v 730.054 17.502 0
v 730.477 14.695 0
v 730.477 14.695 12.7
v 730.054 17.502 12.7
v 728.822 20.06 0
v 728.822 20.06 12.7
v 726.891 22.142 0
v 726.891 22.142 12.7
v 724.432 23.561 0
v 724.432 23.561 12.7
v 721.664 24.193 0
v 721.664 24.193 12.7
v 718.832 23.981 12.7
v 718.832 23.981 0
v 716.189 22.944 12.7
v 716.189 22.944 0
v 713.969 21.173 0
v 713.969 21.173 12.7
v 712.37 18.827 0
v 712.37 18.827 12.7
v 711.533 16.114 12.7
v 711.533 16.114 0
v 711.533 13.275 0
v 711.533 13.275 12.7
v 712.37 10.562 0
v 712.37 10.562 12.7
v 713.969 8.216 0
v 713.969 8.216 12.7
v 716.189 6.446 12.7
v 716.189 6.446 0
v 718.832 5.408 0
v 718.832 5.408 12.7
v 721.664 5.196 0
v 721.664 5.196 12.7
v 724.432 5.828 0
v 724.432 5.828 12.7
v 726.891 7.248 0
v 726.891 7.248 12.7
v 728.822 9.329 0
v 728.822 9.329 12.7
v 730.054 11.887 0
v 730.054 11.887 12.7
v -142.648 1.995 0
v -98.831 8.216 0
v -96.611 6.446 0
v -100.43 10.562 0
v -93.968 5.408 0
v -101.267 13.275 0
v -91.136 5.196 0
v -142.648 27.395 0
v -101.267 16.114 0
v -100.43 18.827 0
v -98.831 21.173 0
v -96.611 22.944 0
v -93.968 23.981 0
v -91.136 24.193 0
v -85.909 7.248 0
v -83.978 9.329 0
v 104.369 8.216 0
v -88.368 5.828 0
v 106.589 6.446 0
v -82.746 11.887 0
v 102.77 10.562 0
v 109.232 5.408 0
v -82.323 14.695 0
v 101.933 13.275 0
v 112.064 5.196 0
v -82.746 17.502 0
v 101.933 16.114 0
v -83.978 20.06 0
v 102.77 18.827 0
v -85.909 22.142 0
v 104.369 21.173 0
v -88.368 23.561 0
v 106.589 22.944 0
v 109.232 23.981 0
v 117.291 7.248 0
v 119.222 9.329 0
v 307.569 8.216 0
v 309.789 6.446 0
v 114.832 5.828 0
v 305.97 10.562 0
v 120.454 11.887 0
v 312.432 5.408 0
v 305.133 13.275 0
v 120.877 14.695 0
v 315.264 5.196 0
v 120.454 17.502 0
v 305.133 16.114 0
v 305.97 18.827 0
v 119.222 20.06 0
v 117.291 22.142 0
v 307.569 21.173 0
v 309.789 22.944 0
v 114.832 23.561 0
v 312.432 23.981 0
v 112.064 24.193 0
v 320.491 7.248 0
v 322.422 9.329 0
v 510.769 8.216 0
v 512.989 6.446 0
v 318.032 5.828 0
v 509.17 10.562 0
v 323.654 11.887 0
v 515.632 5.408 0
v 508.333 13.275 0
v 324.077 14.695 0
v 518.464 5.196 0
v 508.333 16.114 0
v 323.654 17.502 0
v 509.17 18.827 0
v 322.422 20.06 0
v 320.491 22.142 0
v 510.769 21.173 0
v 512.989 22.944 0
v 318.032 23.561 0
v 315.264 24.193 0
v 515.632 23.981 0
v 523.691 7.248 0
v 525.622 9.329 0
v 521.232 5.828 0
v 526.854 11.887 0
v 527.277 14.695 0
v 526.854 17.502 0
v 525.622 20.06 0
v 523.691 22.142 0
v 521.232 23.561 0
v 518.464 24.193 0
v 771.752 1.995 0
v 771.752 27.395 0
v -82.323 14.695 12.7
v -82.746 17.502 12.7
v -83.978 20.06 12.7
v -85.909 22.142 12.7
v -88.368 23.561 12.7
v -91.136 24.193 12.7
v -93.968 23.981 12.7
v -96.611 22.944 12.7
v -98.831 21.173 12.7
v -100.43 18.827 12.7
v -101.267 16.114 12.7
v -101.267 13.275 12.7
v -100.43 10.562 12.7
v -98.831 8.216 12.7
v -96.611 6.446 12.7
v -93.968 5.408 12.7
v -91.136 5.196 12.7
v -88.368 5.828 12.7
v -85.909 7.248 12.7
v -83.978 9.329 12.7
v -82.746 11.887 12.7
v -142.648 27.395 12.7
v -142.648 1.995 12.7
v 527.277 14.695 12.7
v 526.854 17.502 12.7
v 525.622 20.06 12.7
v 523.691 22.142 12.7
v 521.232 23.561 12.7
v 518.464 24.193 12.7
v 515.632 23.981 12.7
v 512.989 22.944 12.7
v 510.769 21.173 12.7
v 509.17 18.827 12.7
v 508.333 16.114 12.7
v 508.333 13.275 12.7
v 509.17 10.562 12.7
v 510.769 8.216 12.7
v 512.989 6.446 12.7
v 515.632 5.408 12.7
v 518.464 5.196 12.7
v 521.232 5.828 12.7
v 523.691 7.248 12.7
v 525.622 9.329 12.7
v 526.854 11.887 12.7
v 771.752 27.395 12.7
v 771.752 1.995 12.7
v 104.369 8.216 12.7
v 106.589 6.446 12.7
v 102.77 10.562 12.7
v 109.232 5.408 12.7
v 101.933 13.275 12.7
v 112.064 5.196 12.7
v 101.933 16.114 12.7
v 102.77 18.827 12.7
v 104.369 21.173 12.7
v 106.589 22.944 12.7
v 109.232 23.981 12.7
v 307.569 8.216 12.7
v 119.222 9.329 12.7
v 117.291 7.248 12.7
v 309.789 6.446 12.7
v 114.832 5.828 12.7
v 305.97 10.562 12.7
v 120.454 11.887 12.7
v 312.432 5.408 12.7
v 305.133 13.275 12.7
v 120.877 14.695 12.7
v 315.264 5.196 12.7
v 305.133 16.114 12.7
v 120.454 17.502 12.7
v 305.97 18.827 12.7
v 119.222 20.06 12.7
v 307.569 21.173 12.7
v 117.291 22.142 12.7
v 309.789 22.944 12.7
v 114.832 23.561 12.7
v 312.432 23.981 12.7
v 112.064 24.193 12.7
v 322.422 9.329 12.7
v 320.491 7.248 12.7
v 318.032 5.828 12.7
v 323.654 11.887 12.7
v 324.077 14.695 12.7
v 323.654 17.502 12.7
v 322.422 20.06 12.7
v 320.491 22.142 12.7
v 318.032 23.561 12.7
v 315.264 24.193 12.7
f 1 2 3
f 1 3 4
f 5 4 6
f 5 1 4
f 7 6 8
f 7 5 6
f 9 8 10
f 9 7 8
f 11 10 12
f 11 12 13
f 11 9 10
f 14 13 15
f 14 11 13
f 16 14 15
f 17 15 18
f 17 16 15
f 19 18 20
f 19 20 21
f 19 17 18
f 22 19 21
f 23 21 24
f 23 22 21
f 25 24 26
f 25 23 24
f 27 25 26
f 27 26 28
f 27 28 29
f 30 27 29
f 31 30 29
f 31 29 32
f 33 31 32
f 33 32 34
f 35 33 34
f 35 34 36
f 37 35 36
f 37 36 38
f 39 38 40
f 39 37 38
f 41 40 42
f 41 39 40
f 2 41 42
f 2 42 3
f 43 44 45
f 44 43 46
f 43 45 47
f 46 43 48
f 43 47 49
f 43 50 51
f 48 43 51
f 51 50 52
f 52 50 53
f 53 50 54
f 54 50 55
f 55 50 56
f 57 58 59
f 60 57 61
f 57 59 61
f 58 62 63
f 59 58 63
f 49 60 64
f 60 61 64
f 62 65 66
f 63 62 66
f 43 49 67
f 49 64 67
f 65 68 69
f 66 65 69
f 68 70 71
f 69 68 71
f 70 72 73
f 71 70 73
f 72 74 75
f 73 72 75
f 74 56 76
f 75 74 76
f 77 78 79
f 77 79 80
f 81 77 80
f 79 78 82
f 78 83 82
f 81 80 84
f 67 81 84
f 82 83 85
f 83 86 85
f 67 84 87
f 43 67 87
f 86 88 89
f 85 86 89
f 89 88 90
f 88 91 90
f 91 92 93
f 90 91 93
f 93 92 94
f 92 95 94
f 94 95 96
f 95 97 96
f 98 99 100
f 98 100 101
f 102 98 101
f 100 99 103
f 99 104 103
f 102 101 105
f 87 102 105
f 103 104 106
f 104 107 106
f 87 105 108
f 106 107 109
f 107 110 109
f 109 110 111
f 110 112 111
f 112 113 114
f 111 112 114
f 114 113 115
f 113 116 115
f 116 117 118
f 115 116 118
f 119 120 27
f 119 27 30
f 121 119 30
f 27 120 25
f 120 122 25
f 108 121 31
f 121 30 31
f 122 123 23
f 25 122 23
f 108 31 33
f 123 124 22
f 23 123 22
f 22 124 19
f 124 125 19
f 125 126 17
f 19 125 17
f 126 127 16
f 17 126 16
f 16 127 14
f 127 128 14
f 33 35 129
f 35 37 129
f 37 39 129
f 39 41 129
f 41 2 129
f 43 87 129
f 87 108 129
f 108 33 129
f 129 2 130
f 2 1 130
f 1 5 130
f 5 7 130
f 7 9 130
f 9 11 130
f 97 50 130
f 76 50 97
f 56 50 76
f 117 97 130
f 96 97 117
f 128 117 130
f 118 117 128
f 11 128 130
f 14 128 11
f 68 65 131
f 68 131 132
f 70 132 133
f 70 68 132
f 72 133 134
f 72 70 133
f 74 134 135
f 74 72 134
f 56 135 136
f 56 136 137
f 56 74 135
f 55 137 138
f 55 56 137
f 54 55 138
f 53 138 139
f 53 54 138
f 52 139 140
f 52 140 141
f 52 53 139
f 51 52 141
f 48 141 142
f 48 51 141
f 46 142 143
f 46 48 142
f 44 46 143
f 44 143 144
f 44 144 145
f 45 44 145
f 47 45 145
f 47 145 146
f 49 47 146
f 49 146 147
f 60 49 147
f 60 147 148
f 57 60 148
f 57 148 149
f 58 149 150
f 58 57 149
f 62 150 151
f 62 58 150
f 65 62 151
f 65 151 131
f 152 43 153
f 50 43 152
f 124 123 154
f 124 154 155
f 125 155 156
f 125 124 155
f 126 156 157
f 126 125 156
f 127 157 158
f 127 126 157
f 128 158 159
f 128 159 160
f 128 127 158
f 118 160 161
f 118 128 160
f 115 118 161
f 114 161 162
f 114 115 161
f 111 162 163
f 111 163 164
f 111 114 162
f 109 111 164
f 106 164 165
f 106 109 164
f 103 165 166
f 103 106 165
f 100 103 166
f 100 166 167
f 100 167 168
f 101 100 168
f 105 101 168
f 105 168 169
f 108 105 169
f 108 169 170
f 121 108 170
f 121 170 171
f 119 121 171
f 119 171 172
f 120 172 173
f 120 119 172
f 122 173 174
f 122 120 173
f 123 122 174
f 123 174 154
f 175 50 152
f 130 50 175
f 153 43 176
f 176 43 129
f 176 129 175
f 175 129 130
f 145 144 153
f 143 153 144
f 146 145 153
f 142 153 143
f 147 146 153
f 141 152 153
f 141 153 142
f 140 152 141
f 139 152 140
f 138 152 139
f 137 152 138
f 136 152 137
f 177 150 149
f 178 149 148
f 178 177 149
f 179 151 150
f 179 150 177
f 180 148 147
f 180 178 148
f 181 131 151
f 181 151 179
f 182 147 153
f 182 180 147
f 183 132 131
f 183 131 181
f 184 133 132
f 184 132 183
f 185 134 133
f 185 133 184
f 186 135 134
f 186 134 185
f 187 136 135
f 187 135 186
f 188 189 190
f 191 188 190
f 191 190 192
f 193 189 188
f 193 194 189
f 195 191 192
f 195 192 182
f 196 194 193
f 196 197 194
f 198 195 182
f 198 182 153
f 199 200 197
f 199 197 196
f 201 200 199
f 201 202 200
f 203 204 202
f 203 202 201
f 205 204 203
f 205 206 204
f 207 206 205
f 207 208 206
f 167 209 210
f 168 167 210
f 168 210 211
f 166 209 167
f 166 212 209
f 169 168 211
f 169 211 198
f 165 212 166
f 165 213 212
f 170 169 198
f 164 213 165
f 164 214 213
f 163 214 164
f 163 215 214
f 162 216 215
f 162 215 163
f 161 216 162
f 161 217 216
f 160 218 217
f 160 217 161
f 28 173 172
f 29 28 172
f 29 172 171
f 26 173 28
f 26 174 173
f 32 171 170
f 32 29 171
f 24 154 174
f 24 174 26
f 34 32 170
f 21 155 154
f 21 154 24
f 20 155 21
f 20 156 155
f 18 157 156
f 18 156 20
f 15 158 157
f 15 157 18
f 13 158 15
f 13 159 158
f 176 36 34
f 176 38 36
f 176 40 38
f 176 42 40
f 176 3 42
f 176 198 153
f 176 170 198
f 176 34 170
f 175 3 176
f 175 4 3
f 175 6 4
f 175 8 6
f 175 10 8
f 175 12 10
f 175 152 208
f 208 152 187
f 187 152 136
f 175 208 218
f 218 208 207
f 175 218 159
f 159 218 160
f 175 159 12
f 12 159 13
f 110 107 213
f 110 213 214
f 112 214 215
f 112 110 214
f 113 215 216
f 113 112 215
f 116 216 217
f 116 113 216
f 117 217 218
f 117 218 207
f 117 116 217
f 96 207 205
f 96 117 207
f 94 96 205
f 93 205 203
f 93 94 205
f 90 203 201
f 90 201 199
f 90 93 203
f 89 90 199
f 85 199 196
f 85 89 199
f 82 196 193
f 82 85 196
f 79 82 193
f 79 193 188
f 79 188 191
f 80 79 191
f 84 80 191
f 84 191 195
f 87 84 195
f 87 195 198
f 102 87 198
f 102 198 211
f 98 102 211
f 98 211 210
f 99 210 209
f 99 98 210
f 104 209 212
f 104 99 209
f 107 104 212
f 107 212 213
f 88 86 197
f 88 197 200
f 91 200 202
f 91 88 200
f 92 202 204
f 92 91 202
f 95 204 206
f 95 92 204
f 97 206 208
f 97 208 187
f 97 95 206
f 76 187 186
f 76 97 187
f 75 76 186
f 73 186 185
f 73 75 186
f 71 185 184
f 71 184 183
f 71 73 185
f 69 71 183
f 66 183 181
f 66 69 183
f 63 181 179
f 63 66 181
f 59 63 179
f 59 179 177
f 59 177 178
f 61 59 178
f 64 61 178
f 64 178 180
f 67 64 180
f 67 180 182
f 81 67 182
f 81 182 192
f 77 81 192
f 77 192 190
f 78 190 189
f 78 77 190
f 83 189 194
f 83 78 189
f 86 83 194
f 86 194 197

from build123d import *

# Parameters (mm, degrees)
F0_W     = 914.4
F0_H     = 25.4
F0_R     = 9.525
F1_DEPTH = 12.7


with BuildPart() as f1:
    # F0 (on Top) → F1 (new body)
    with BuildSketch(Plane.XY):
        with Locations((314.551775, 14.694642)):
            Rectangle(F0_W, F0_H)
        with Locations((-91.848225, 14.694642)):
            Circle(F0_R, mode=Mode.SUBTRACT)
        with Locations((111.351775, 14.694642)):
            Circle(F0_R, mode=Mode.SUBTRACT)
        with Locations((314.551775, 14.694642)):
            Circle(F0_R, mode=Mode.SUBTRACT)
        with Locations((517.751775, 14.694642)):
            Circle(F0_R, mode=Mode.SUBTRACT)
        with Locations((720.951775, 14.694642)):
            Circle(F0_R, mode=Mode.SUBTRACT)
    extrude(amount=F1_DEPTH)


solid = f1.part
